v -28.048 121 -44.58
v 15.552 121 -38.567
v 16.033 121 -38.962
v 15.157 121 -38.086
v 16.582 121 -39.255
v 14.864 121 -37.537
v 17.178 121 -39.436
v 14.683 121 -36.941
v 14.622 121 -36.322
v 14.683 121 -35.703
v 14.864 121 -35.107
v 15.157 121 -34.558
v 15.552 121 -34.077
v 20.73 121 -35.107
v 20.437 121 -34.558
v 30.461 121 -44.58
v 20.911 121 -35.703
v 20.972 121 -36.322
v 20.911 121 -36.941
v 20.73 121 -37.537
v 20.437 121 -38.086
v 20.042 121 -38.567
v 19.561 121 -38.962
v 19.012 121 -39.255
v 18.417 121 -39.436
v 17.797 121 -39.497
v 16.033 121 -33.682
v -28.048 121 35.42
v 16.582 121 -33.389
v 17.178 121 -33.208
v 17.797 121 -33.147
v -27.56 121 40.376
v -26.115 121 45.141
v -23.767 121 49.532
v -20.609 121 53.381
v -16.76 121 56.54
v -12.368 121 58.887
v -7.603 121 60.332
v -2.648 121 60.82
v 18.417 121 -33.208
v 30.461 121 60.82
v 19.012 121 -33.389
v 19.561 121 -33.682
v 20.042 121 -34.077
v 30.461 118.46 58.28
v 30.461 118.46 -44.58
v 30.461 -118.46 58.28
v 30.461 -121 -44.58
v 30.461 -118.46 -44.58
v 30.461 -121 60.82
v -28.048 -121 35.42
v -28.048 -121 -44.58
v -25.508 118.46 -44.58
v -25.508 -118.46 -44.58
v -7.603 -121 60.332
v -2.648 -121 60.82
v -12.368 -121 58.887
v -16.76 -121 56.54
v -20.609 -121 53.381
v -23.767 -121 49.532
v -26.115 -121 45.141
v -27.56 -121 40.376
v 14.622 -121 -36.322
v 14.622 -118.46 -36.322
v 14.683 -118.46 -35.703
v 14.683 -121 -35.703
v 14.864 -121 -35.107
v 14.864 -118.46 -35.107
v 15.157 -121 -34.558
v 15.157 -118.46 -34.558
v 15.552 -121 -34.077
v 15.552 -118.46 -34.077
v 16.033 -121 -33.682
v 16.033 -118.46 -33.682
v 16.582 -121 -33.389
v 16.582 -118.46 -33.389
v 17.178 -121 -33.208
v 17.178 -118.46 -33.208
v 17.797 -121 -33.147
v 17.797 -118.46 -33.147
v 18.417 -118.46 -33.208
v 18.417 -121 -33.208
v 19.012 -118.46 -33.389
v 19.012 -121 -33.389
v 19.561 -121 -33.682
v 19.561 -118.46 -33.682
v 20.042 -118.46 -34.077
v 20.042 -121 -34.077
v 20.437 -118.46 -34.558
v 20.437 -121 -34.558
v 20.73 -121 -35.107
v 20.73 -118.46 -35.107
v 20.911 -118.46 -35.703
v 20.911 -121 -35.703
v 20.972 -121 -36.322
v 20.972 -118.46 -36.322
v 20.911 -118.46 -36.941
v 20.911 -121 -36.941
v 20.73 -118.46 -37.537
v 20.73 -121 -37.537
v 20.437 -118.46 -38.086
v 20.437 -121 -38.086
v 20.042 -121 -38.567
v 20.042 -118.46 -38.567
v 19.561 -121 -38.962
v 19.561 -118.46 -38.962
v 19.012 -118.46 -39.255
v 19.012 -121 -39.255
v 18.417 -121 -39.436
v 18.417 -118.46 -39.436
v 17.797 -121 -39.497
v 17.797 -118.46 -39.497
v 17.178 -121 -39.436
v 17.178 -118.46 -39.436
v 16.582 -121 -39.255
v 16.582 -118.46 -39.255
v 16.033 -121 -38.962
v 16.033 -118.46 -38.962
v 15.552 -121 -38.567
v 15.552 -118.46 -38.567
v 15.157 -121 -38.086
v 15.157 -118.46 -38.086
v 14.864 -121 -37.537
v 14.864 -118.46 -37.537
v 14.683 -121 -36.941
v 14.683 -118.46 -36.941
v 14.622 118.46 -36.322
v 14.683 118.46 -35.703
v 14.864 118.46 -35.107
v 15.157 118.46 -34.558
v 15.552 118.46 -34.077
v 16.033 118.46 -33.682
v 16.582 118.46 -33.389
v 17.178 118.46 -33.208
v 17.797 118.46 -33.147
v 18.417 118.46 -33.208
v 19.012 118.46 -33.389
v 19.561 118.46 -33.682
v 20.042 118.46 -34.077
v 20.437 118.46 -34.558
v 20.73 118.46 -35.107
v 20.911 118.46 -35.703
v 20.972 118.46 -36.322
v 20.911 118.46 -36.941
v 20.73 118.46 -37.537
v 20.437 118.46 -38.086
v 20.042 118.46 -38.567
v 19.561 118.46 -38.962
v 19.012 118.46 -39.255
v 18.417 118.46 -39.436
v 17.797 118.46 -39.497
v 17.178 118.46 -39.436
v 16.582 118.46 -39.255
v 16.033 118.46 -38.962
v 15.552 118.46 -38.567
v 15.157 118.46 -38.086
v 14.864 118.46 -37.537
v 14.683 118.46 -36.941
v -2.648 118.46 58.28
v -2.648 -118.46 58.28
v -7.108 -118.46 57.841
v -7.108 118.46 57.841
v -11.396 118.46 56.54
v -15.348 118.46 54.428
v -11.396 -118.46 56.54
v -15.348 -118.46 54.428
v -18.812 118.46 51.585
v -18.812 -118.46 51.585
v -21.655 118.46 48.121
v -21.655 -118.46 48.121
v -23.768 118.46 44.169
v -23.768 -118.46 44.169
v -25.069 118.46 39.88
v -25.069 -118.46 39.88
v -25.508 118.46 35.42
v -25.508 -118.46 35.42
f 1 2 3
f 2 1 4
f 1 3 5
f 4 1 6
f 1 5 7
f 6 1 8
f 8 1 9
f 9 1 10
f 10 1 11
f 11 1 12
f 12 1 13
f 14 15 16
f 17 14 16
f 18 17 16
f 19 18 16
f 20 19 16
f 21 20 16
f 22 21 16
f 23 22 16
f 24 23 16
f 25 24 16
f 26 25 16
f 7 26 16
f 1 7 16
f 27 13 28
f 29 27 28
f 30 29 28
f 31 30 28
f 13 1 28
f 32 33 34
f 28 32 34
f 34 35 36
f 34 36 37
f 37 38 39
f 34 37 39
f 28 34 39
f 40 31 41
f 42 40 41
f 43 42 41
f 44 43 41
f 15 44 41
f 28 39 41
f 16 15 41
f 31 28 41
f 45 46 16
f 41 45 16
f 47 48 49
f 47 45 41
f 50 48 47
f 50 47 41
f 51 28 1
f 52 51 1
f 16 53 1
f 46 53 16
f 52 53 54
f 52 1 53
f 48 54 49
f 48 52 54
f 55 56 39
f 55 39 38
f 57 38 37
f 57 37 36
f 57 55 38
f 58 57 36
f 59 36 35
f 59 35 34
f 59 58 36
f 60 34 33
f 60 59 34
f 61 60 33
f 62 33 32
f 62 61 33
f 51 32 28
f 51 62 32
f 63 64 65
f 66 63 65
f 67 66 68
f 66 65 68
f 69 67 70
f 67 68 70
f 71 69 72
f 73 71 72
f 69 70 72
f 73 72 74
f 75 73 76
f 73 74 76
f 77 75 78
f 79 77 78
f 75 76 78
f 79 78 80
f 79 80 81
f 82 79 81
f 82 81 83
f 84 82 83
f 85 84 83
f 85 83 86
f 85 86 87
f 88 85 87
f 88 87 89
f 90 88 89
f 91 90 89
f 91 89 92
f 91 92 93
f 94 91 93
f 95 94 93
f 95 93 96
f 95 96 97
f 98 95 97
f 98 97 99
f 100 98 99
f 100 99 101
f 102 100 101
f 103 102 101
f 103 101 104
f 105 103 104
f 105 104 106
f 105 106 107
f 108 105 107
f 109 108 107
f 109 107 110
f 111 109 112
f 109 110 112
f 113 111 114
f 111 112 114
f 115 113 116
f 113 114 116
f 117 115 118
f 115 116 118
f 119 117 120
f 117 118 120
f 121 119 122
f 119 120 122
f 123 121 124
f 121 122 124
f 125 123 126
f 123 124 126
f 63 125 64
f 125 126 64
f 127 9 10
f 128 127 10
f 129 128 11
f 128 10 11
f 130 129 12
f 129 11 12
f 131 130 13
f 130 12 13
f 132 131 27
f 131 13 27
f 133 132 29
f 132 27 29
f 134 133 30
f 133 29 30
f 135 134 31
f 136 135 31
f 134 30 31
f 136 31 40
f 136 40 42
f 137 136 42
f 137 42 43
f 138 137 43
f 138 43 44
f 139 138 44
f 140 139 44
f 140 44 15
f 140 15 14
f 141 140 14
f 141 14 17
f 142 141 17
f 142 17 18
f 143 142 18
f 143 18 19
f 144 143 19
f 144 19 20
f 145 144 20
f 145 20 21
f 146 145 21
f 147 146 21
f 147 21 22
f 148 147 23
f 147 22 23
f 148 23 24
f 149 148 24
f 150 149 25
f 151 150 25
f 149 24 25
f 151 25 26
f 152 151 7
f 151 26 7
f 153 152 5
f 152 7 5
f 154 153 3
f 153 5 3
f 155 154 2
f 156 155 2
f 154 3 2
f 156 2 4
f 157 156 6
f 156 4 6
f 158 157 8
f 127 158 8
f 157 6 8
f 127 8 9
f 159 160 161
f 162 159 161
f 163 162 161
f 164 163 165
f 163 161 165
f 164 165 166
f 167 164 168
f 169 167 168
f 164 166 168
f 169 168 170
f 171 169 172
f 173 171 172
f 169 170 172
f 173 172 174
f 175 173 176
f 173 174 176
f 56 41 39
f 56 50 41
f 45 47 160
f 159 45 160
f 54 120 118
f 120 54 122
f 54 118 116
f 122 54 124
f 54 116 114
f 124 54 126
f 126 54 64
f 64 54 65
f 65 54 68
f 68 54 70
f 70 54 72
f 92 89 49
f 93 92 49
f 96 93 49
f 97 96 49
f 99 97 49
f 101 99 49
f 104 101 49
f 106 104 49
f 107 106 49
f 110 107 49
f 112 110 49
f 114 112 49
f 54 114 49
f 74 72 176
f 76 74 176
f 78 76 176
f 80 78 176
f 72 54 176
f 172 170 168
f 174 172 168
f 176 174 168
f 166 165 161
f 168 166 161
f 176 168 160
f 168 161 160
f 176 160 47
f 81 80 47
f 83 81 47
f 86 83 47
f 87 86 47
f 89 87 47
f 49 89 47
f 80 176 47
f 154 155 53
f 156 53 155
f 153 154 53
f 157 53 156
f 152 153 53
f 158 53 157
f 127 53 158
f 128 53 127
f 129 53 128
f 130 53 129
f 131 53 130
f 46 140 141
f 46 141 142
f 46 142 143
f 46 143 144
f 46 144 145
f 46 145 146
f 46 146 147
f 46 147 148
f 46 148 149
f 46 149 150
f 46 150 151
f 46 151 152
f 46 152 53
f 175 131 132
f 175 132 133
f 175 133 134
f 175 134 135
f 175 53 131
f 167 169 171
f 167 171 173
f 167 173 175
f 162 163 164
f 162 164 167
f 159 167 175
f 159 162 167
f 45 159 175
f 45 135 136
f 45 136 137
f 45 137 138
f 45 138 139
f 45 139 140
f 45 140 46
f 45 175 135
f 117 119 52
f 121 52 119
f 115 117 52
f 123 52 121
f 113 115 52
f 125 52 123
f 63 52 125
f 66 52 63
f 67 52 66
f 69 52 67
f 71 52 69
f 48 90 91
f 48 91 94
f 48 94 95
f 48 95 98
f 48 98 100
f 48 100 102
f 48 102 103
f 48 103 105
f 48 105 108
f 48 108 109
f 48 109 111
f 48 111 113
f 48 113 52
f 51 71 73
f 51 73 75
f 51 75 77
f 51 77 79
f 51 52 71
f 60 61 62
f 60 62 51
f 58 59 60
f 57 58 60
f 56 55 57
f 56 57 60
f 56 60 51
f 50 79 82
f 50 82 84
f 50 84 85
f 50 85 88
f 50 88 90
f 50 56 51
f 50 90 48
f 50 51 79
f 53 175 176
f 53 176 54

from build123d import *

# Parameters (mm, degrees)
F1_DEPTH = 121
F2_T     = -2.54
F4_D     = 6.35


with BuildPart() as f1:
    # F0 (on Front) → F1 (new body, symmetric)
    with BuildSketch(Plane.XZ):
        with BuildLine():
            Line((30.46076, 60.820436), (-2.648024, 60.820436))
            ThreePointArc((-2.648024, 60.820436), (-20.608536, 53.380948), (-28.048024, 35.420436))
            Line((-28.048024, 35.420436), (-28.048024, -44.579564))
            Line((-28.048024, -44.579564), (30.46076, -44.579564))
            Line((30.46076, -44.579564), (30.46076, 60.820436))
        make_face()
    extrude(amount=F1_DEPTH, both=True)

    # F2
    f2_openings = [f1.faces().sort_by_distance(p)[0] for p in [
        (30.46076, 0, 8.120436),
        (1.206368, 0, -44.579564),
    ]]
    offset(amount=F2_T, openings=f2_openings)

    # F4 (through all)
    with Locations(Plane.XZ.offset(121)):
        with Locations((17.797152, -36.322009)):
            Hole(F4_D / 2)


solid = f1.part
